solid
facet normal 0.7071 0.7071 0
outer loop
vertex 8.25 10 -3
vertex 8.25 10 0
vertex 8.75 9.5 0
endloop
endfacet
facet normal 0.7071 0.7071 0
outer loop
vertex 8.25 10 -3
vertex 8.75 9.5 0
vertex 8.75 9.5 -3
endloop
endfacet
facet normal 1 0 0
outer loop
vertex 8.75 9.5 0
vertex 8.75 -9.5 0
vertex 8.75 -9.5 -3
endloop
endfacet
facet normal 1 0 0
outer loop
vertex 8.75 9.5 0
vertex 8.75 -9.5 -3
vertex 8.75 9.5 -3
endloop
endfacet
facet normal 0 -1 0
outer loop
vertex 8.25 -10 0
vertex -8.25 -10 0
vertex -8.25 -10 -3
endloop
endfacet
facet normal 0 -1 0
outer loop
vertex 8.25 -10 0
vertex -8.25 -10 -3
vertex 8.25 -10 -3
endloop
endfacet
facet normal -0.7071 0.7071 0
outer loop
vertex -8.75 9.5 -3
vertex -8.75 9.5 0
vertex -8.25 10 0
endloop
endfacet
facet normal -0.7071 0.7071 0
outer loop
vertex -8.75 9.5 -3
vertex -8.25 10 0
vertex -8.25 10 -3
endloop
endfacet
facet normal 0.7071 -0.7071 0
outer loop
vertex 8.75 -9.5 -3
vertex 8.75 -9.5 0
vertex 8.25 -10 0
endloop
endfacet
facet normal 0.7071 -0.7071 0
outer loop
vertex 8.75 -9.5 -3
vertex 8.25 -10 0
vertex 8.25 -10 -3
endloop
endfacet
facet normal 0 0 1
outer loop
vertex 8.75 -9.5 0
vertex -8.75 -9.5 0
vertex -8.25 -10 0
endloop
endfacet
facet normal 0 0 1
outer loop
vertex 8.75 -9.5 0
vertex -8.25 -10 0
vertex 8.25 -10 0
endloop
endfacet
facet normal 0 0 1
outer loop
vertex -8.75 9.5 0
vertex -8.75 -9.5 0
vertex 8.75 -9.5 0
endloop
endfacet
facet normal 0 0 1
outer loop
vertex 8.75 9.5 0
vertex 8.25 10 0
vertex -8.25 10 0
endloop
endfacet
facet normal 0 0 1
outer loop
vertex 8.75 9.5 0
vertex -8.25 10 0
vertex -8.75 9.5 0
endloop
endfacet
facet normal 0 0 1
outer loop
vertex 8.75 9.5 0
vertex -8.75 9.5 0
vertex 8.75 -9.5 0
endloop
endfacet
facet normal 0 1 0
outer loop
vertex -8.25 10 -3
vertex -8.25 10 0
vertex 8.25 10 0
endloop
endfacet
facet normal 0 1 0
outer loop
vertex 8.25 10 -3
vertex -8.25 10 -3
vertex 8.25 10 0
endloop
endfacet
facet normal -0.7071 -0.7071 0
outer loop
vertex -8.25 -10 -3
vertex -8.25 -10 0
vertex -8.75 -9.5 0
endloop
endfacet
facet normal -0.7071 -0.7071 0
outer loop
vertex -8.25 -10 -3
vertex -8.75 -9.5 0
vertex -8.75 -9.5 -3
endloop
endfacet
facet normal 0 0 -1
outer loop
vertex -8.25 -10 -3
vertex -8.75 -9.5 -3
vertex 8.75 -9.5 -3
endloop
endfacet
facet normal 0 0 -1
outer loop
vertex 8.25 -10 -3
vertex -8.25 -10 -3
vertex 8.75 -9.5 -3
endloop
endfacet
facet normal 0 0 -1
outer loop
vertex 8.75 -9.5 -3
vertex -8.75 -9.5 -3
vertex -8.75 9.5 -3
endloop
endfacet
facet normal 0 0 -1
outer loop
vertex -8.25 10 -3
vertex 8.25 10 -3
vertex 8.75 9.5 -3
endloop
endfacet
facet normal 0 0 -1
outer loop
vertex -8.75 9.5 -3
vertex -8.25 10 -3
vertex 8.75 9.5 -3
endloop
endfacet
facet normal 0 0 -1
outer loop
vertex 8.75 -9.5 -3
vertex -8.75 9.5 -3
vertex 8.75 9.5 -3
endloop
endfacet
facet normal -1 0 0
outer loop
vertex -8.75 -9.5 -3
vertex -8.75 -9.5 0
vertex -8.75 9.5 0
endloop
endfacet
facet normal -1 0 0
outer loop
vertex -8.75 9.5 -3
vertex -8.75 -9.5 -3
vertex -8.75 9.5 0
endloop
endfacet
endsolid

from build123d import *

# Parameters (mm, degrees)
SCHIZZO1_W                   = 17.5
SCHIZZO1_H                   = 20
ESTRUSIONE_ESTRUSIONE1_DEPTH = 3
SMUSSO1_SIZE                 = 0.5
SMUSSO2_SIZE                 = 0.5
SMUSSO3_SIZE                 = 0.5
SMUSSO4_SIZE                 = 0.5


with BuildPart() as part:
    # Schizzo1 → Estrusione-Estrusione1 (new body)
    with BuildSketch(Plane.XY):
        Rectangle(SCHIZZO1_W, SCHIZZO1_H)
    extrude(amount=-ESTRUSIONE_ESTRUSIONE1_DEPTH)

    # Smusso1
    smusso1_edges = [part.edges().sort_by_distance(p)[0] for p in [
        (-8.75, -10, -1.5),
    ]]
    chamfer(smusso1_edges, length=SMUSSO1_SIZE)

    # Smusso2
    smusso2_edges = [part.edges().sort_by_distance(p)[0] for p in [
        (8.75, -10, -1.5),
    ]]
    chamfer(smusso2_edges, length=SMUSSO2_SIZE)

    # Smusso3
    smusso3_edges = [part.edges().sort_by_distance(p)[0] for p in [
        (8.75, 10, -1.5),
    ]]
    chamfer(smusso3_edges, length=SMUSSO3_SIZE)

    # Smusso4
    smusso4_edges = [part.edges().sort_by_distance(p)[0] for p in [
        (-8.75, 10, -1.5),
    ]]
    chamfer(smusso4_edges, length=SMUSSO4_SIZE)


solid = part.part
